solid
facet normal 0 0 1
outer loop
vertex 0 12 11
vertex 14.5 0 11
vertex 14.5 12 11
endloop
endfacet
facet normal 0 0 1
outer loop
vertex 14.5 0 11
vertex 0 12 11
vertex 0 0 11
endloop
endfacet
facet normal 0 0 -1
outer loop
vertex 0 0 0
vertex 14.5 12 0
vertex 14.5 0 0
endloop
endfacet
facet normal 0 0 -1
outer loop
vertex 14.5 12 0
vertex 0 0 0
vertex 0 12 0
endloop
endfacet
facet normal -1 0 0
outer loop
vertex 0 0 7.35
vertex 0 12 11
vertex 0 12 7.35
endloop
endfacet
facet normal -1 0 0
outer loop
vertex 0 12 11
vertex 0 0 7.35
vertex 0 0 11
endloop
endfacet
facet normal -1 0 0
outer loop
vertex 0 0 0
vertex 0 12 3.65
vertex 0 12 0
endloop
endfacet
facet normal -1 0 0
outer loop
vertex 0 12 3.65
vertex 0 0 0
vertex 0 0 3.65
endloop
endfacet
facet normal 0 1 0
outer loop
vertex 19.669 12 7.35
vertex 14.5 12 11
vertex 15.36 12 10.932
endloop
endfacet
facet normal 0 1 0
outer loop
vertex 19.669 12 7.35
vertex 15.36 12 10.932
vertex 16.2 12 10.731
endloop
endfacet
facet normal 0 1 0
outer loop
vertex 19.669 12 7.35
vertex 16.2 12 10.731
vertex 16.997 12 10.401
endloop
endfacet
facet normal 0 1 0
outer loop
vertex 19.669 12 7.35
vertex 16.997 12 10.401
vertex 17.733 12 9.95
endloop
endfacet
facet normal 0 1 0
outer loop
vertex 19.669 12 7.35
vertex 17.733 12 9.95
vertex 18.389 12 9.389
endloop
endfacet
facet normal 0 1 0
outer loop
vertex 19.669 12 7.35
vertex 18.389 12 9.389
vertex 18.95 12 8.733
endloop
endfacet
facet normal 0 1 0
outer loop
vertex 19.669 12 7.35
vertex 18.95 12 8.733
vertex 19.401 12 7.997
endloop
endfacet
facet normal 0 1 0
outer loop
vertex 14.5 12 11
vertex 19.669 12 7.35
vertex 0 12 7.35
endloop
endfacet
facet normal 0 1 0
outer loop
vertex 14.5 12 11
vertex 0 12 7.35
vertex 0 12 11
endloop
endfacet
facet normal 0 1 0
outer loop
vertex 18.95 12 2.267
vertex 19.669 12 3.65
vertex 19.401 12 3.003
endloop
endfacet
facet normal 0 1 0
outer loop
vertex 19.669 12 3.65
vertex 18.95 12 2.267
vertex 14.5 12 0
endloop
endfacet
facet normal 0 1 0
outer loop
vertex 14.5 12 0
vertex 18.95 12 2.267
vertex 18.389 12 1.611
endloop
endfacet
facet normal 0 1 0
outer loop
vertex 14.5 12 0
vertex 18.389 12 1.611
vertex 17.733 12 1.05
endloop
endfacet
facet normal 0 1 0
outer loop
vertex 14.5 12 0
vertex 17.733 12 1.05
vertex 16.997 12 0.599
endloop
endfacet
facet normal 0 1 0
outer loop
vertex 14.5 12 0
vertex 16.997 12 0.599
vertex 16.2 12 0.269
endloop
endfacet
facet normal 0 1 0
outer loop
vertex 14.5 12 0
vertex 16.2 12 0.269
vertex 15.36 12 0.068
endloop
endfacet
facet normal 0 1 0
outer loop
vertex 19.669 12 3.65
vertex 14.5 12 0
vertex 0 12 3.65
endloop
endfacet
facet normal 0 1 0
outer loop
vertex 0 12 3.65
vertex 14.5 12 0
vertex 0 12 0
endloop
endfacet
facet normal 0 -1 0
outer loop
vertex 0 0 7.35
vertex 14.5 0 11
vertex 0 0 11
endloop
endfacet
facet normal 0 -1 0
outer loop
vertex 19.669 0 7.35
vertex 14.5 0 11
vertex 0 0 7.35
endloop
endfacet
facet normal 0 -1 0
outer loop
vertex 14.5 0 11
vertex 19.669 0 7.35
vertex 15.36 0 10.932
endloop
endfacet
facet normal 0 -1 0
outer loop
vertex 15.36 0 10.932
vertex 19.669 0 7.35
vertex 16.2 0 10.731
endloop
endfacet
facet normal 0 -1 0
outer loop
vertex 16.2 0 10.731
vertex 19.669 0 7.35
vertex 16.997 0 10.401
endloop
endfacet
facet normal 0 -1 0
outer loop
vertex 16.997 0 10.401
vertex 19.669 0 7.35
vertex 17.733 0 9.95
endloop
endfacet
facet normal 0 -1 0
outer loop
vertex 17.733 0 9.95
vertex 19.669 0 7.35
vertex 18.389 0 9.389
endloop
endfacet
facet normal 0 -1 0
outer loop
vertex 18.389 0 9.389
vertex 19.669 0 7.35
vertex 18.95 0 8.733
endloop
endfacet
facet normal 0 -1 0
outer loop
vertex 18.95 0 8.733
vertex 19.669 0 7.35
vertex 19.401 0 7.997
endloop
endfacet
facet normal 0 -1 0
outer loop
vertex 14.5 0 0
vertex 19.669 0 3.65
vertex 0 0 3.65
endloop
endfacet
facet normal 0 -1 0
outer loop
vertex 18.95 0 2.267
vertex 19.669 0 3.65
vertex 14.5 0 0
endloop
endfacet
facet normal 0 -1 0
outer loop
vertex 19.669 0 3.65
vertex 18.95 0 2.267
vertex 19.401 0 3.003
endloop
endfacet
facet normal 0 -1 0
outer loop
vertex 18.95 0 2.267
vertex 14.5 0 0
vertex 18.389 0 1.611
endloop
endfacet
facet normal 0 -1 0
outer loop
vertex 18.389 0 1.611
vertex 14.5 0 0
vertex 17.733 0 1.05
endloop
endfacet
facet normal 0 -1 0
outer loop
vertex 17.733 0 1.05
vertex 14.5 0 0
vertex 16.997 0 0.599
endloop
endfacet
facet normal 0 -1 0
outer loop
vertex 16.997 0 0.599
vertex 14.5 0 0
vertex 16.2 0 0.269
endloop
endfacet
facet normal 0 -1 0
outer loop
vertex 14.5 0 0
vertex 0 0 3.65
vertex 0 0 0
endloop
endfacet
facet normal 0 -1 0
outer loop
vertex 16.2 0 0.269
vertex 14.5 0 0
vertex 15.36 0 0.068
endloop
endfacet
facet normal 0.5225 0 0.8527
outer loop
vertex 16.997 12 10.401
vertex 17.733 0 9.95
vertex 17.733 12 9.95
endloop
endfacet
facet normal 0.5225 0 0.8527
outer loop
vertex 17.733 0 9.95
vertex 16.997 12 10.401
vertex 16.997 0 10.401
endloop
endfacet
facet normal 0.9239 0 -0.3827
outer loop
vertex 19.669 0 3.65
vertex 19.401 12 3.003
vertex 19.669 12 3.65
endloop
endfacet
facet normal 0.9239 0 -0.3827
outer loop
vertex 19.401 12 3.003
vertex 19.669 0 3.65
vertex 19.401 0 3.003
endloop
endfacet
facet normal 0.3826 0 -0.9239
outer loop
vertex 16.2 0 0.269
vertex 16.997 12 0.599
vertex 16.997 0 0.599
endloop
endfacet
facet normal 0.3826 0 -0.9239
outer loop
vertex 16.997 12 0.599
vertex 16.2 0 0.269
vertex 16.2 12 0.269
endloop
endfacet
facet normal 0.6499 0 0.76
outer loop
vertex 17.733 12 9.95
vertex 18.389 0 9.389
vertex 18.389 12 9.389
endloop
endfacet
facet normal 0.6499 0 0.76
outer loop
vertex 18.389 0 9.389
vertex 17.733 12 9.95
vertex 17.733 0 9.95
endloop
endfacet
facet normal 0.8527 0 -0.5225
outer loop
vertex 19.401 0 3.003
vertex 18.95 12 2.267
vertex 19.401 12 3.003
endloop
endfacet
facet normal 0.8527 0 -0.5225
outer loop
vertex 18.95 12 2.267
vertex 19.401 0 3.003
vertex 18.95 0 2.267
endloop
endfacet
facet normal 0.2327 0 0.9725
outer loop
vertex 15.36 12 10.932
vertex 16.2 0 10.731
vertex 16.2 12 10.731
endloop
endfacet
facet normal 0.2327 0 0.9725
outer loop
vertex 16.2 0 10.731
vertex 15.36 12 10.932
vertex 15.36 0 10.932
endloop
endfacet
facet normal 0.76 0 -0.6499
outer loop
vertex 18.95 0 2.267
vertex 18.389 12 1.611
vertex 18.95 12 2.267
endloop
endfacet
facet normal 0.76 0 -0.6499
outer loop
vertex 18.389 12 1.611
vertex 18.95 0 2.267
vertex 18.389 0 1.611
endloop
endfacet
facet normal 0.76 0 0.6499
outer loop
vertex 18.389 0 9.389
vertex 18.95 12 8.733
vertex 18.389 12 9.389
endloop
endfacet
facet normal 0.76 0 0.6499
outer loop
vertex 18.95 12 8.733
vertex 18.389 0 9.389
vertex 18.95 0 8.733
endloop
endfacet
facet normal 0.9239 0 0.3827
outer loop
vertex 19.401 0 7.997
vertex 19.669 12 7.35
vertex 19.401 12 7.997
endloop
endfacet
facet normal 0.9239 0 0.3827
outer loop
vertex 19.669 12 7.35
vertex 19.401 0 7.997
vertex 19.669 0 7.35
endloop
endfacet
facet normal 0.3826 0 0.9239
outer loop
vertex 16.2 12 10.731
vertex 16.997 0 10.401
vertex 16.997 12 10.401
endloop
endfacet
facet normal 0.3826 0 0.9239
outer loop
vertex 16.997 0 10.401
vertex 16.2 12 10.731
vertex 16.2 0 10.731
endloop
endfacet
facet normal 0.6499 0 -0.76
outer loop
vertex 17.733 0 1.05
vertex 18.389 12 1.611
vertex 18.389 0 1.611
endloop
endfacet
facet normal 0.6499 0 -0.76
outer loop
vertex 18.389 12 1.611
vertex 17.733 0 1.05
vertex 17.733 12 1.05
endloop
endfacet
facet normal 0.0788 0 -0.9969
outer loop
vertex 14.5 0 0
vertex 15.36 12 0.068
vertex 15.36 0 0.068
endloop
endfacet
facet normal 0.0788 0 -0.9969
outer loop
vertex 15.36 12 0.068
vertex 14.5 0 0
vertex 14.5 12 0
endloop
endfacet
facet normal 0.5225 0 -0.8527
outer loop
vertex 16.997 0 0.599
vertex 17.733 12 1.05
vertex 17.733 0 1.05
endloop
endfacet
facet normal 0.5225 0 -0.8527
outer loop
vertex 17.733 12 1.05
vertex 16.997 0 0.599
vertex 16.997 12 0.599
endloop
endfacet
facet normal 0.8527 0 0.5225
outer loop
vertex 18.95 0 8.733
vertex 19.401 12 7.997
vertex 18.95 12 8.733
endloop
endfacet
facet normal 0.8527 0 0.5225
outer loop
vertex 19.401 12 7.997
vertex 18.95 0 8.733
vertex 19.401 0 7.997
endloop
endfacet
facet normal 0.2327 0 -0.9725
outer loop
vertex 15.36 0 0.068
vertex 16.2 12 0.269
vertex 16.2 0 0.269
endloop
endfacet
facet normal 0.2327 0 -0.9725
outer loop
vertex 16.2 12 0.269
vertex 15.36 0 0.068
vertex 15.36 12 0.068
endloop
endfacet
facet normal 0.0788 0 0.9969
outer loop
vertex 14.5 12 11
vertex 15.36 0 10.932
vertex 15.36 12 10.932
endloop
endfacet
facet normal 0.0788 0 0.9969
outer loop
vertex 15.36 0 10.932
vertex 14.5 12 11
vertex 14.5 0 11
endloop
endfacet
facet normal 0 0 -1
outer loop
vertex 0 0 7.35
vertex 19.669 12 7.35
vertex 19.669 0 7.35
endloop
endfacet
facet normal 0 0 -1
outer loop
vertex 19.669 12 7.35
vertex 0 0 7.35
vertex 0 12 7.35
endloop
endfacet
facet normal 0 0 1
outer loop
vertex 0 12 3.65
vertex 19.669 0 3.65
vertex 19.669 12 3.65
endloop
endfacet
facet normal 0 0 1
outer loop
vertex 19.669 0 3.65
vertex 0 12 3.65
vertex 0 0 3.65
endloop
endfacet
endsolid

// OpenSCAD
//This is a holder for a laser maker.
//It is intended to hold laser line makers on our lasercutter.


//==========Define Geometry============
clr = 0.1;//mm
x_len= 20;//mm - Overall length
y_len= 12;//mm - Overall width
z_len= 11;//mm - Overall height
r_end= 5.5;//mm - x-end radius
pl_thk = 3.7;//mm - Plate thickness
r_hole = 1.5;//mm - radius of bolt hole

FUDGE = 0.1; // this is overextension necessary for parts to subtract cleanly

//==========Render====================
body();

//==========Modules===================
module body()
{
   
    difference() {
        outline();
        
        //subtract clearance for plate mount
        translate([-FUDGE,-FUDGE/2,(z_len-pl_thk)/2])
            cube([x_len + FUDGE,y_len + FUDGE,pl_thk]);
        
        //subtract hole for lasermount
        translate([x_len-r_end,0,z_len/2])
            rotate([-90,0,0])
            cylinder( h= y_len, r= r_hole, $fn = 40);
        
        
    };
        
};

module outline() {
    //Create outline of body
    union() {
        cube([x_len-r_end,y_len,z_len]);
        translate([x_len-r_end,0,r_end])
            rotate([-90,0,0])
                cylinder(h = y_len, r = r_end, $fn = 40);
        
        
    };
};
